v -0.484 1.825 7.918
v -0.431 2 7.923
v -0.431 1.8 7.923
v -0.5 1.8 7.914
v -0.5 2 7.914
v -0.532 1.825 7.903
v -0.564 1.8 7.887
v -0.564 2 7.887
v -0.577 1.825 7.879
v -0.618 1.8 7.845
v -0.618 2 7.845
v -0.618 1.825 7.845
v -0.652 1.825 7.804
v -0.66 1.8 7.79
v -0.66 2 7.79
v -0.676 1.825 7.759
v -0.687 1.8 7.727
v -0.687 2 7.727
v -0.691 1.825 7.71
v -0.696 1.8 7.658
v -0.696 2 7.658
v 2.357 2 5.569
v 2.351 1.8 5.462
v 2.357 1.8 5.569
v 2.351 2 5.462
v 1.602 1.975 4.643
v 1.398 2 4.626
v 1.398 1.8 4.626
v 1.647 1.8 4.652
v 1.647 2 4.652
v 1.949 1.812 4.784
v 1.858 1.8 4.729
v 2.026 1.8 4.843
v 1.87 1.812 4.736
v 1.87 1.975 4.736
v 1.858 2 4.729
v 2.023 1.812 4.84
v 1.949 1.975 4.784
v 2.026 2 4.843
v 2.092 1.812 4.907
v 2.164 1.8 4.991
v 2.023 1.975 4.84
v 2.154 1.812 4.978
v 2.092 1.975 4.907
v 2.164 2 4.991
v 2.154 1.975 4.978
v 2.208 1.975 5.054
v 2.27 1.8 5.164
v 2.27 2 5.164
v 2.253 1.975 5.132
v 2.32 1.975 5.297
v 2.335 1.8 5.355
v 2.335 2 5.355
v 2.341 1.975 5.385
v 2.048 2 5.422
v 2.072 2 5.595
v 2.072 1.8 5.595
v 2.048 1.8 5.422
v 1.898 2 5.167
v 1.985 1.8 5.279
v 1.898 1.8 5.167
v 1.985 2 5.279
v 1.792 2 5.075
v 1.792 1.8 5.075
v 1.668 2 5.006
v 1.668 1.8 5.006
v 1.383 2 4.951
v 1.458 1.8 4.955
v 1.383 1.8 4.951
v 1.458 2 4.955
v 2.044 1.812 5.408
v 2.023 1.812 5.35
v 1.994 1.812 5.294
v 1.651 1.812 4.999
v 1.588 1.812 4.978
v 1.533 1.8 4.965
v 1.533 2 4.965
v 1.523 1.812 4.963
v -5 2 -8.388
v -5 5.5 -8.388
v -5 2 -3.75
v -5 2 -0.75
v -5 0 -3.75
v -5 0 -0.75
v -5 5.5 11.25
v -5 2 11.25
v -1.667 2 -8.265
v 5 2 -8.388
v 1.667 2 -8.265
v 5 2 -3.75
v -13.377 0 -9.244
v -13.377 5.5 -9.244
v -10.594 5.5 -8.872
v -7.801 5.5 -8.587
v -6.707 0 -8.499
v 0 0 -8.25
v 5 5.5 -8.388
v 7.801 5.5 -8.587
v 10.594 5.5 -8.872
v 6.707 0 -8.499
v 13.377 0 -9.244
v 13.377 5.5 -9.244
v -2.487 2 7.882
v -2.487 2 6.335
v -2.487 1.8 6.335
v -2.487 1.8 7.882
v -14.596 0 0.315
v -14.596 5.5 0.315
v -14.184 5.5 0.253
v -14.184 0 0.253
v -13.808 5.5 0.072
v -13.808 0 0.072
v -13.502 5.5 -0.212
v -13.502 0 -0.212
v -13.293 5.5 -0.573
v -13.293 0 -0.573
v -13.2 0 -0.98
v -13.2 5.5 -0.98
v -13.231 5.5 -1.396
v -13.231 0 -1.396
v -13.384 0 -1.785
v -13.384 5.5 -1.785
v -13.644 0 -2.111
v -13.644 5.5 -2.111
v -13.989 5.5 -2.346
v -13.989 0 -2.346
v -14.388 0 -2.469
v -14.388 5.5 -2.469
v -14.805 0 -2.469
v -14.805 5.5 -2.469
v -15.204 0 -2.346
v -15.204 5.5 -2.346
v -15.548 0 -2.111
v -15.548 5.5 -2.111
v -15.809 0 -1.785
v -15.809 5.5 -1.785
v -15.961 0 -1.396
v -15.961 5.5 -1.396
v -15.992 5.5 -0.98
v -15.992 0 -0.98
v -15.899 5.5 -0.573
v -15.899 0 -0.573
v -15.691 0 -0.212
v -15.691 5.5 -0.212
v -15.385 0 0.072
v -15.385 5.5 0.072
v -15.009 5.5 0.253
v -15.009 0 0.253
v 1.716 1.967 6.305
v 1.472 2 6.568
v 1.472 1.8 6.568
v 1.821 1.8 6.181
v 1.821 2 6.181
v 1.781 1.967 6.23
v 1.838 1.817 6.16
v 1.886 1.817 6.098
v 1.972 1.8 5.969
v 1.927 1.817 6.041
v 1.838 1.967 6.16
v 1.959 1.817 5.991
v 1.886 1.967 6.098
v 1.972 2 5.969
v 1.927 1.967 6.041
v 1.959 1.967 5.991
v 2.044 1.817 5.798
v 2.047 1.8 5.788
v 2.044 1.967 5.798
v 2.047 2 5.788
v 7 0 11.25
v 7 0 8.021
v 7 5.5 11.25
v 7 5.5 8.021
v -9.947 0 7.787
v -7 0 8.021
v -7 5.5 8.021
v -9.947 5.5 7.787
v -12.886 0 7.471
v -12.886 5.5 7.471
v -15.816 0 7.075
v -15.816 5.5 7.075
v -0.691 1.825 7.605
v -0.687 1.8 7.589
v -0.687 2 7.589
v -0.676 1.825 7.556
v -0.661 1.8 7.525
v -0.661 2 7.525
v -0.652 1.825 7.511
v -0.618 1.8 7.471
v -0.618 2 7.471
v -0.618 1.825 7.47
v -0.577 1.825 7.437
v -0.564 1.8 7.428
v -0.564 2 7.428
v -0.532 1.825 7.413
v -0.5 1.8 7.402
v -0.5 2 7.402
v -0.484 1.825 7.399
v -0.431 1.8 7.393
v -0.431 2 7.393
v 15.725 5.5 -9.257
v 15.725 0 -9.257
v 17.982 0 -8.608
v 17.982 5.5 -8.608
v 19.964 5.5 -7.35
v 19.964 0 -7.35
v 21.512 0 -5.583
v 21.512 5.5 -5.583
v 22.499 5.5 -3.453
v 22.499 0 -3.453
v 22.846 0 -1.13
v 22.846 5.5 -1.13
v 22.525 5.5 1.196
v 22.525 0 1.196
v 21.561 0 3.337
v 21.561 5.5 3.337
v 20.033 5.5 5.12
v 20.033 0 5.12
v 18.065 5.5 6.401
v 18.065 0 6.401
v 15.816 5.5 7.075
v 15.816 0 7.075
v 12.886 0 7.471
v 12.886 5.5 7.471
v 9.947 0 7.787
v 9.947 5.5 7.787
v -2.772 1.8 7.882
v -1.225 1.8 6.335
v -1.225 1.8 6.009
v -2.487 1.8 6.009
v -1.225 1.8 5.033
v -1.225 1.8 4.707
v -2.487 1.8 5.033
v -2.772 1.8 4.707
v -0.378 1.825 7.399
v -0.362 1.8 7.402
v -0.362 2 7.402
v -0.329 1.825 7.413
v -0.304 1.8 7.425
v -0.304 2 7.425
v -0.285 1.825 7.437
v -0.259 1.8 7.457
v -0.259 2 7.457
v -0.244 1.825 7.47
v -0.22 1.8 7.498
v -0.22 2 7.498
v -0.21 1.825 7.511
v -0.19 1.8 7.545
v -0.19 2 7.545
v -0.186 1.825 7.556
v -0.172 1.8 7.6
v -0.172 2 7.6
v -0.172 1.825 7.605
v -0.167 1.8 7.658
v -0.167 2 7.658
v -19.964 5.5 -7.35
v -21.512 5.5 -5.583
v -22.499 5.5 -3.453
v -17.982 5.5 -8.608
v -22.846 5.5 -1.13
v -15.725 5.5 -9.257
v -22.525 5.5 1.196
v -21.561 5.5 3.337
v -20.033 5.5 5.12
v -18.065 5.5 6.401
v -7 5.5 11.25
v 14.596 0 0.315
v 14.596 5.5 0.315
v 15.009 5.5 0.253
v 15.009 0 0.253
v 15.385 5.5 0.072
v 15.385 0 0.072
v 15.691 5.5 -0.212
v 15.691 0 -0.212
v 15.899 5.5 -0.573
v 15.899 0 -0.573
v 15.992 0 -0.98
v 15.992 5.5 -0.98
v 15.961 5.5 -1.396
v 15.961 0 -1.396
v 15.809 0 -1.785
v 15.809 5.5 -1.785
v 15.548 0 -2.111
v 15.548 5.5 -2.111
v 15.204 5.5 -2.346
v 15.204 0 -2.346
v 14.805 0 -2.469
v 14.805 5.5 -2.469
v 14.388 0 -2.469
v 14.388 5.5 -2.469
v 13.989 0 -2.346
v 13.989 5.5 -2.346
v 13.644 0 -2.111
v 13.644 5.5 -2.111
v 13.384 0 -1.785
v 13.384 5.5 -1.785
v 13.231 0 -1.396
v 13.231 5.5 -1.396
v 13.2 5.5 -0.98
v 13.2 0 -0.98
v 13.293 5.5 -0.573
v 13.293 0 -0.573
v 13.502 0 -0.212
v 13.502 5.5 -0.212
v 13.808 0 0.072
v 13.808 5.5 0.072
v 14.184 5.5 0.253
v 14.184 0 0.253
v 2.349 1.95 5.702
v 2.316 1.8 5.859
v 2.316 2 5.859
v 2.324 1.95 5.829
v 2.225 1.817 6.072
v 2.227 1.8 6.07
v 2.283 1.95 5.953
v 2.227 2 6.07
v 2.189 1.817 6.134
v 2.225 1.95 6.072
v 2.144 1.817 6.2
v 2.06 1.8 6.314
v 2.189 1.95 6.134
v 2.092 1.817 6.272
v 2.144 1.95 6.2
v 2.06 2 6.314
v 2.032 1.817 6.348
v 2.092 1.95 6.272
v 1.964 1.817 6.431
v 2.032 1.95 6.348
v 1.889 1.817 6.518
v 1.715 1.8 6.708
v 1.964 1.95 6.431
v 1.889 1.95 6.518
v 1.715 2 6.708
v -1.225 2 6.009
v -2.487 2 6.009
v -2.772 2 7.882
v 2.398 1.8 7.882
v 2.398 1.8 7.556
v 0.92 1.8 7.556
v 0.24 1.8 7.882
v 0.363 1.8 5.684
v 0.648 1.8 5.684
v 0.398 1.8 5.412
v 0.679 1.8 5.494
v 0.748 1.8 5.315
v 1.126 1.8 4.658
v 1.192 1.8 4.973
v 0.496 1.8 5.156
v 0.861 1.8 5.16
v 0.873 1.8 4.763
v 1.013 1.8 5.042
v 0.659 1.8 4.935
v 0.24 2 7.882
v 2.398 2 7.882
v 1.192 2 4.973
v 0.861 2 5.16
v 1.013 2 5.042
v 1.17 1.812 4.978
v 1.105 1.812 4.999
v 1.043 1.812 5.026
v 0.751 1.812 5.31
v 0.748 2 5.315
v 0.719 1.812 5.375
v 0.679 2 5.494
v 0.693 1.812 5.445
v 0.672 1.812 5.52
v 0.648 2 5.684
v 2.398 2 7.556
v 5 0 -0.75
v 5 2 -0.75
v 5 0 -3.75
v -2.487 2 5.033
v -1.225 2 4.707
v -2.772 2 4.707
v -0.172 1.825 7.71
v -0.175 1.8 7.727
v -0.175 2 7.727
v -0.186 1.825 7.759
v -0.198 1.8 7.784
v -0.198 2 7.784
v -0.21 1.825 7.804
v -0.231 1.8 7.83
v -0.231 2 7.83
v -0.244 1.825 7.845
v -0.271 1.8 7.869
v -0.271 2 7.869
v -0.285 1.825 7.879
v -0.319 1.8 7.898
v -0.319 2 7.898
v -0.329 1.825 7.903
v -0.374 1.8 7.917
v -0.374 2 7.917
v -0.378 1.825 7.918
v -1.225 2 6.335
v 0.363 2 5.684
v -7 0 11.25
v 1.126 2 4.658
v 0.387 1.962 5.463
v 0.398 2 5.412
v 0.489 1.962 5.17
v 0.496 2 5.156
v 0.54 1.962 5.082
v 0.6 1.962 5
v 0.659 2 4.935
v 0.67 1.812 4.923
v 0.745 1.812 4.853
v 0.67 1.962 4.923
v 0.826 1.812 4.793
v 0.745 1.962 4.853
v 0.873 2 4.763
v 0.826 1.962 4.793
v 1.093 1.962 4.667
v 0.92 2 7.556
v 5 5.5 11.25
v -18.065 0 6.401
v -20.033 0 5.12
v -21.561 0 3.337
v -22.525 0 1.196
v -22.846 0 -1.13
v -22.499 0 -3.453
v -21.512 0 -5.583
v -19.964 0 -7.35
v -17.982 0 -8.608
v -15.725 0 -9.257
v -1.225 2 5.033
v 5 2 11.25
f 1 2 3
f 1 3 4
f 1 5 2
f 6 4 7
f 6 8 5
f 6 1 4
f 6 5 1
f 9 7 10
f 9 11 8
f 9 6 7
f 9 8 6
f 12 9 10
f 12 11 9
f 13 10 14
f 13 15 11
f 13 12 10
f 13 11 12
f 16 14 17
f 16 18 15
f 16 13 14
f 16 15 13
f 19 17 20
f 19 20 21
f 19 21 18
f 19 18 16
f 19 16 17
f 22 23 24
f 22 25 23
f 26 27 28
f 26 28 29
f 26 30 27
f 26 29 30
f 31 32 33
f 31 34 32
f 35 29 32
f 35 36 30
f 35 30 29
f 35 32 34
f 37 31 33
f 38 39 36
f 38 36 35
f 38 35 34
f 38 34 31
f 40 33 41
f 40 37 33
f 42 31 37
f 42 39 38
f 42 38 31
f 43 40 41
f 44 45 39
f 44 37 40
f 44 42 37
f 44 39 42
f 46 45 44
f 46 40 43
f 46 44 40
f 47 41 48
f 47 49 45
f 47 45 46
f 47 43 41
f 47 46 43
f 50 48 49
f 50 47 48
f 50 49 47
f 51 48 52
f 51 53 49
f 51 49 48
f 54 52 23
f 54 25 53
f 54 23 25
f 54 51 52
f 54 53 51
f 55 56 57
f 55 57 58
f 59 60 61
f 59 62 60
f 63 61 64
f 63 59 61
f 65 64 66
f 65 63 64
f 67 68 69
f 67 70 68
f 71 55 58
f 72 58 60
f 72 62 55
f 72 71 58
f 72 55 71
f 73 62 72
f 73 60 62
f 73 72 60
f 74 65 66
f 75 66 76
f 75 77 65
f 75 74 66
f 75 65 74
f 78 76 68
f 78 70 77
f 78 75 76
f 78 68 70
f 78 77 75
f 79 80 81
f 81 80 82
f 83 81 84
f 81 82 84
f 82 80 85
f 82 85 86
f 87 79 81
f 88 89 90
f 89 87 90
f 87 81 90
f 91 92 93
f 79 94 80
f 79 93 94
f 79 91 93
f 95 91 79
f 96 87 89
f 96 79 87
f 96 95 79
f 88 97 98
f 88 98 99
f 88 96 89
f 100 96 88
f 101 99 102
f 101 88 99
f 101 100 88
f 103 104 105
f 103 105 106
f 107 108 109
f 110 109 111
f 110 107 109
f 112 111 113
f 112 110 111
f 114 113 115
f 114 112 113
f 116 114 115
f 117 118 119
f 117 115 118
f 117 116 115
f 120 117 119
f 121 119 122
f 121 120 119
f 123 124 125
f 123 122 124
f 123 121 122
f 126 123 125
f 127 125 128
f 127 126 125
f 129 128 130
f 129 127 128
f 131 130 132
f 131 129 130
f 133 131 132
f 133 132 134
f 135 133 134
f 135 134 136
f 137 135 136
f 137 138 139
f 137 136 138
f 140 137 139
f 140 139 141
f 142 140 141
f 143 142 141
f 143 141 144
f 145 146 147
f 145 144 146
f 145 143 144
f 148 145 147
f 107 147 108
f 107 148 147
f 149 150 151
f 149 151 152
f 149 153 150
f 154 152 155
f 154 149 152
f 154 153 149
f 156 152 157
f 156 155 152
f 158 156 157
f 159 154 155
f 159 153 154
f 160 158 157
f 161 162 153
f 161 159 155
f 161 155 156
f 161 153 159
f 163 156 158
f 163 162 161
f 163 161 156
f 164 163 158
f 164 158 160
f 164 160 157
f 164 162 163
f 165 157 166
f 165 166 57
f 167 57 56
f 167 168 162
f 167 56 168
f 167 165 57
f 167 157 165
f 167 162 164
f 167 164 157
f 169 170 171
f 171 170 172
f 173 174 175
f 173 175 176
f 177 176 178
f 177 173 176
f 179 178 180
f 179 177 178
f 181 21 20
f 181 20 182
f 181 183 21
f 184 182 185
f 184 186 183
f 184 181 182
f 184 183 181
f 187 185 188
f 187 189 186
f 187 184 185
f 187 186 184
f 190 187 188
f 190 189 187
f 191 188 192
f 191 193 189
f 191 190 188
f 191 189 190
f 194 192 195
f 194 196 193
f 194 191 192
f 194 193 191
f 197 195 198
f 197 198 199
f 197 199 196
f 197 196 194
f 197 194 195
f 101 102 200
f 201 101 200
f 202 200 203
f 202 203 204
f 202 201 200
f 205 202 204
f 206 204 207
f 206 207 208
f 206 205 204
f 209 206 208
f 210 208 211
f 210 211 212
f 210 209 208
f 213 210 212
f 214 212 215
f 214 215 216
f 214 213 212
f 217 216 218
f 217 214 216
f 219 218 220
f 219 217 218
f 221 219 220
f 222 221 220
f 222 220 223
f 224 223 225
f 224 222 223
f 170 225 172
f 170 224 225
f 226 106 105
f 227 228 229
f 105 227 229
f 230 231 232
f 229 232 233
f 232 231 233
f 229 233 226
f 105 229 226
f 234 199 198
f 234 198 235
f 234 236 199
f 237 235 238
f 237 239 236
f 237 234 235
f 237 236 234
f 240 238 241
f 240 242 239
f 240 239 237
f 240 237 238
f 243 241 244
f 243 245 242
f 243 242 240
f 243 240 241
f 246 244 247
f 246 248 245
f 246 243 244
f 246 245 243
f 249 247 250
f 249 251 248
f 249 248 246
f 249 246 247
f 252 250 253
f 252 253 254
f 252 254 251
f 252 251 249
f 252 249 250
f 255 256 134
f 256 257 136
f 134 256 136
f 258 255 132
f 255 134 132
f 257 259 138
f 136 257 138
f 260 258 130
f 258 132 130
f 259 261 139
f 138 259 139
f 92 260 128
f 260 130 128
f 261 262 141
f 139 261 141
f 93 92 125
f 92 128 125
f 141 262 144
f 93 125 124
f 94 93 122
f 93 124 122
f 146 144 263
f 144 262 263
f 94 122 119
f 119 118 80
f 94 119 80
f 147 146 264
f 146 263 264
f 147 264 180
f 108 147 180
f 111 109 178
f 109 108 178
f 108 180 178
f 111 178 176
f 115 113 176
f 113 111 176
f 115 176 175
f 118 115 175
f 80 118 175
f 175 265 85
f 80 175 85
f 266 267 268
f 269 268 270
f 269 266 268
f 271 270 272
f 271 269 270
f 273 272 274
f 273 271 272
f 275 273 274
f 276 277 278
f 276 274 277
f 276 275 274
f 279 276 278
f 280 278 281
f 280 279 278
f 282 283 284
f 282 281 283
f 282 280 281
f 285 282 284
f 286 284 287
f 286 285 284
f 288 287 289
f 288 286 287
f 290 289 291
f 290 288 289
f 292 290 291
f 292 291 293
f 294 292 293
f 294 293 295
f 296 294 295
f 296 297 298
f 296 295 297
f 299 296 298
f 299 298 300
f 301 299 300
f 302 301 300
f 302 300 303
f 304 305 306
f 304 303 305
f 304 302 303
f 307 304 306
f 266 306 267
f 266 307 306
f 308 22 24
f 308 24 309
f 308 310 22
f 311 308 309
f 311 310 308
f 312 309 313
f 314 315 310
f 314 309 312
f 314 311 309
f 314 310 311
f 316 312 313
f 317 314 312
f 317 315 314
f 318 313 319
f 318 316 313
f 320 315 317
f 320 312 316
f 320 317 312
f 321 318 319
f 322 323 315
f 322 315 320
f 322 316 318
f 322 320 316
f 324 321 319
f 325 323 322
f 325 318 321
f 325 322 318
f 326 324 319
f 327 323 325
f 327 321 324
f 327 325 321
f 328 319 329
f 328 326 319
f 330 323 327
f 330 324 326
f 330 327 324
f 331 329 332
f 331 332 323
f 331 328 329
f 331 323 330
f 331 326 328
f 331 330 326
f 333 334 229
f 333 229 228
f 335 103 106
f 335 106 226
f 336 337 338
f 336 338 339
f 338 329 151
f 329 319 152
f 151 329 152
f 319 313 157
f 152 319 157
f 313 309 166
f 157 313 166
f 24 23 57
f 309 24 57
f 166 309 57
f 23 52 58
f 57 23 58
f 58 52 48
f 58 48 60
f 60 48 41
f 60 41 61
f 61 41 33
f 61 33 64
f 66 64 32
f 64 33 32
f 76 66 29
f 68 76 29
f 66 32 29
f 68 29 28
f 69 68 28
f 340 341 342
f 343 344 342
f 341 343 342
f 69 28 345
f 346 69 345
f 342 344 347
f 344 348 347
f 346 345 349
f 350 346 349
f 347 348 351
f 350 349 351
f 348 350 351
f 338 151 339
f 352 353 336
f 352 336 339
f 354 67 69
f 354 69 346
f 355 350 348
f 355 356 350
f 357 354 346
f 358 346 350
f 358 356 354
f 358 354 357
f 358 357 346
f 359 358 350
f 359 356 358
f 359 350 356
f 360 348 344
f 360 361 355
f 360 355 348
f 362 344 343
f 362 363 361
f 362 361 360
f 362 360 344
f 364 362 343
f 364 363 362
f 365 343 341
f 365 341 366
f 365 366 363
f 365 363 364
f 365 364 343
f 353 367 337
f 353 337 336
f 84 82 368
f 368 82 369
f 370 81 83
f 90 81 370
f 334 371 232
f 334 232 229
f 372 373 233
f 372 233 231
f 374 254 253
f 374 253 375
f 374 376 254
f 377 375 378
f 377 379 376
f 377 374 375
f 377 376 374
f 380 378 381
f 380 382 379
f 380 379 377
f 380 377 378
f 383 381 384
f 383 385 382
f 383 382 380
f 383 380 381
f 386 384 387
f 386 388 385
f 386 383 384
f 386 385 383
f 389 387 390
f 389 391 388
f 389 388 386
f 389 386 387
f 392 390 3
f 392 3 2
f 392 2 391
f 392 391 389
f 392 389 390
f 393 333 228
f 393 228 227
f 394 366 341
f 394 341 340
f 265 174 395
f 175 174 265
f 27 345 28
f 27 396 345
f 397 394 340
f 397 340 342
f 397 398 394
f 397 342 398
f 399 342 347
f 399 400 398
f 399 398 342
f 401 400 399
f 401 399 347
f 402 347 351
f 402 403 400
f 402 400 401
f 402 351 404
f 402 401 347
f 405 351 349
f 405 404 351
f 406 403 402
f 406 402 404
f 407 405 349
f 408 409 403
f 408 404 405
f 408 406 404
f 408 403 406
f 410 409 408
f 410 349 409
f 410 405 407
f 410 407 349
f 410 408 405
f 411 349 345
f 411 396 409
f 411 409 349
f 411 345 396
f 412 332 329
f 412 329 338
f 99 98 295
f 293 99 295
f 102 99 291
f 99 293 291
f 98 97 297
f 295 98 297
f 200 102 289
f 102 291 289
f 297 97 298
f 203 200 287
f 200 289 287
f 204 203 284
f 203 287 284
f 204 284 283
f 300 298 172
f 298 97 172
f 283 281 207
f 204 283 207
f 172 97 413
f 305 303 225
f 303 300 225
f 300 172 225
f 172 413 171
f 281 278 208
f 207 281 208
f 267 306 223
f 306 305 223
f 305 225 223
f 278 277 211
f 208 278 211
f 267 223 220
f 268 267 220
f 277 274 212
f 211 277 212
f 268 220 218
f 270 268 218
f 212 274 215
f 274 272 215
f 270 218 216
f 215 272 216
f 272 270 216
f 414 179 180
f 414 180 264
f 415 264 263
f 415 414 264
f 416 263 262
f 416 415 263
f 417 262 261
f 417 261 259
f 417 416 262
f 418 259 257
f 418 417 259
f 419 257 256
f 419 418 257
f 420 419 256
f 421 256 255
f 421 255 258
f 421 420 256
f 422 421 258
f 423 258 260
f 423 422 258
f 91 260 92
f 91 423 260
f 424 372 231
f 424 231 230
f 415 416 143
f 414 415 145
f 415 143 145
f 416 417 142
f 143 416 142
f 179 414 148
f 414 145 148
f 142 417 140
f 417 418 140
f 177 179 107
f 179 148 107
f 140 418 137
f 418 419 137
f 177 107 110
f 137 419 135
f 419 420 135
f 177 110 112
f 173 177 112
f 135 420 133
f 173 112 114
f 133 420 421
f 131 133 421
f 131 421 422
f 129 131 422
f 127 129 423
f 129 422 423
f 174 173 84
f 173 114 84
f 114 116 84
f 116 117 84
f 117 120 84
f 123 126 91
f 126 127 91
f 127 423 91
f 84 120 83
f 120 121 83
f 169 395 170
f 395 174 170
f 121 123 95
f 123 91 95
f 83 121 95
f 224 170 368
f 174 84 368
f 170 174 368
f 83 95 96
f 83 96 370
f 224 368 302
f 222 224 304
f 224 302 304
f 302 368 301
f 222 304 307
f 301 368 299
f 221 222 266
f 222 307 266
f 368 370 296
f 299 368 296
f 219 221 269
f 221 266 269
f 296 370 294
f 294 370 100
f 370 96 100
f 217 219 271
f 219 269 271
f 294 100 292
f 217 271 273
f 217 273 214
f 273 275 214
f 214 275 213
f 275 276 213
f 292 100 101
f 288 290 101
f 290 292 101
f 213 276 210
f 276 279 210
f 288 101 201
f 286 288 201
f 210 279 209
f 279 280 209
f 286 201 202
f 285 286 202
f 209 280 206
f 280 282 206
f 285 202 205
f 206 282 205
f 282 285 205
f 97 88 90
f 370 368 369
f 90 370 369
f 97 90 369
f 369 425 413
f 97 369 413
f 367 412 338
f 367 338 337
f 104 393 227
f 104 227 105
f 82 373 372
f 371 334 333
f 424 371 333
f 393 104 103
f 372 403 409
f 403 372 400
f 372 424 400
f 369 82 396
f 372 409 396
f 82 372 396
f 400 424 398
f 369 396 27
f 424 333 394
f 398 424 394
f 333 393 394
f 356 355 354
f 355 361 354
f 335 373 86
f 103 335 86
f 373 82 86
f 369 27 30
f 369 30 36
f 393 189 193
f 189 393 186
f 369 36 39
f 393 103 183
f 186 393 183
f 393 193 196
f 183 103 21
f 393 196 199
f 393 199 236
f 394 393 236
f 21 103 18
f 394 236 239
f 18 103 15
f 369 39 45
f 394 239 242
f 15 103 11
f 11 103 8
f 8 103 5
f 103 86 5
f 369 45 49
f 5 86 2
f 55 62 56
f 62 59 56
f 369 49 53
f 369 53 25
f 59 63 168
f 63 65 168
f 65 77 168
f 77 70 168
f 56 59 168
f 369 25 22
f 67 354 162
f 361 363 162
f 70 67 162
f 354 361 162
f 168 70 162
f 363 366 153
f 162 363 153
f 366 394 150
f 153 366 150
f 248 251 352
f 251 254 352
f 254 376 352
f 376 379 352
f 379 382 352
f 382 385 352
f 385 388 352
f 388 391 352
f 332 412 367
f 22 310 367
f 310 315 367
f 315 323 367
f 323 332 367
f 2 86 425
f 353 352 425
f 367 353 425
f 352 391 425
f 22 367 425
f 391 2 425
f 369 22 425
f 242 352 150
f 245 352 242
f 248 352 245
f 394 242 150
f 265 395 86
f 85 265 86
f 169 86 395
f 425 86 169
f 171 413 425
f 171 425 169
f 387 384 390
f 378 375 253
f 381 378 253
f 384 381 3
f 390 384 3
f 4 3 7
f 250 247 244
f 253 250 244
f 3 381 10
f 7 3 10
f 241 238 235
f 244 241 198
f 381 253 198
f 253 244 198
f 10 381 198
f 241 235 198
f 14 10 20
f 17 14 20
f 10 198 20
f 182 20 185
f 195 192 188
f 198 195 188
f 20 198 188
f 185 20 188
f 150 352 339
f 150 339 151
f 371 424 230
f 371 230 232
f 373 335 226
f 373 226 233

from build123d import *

# Parameters (mm, degrees)
SKETCH2_R                       = 1.4
BOSS_EXTRUDE1_DEPTH             = 14
BOSS_EXTRUDE2_REACH             = 34.049
BOSS_EXTRUDE2_END_RADIUS        = 107
SKETCH3_W                       = 14
SKETCH3_H                       = 14
BOSS_EXTRUDE2_DIRECTION_2_DEPTH = 3
SKETCH19_W                      = 15.846179349
SKETCH19_H                      = 3
CUT_EXTRUDE4_DEPTH              = 22
CUT_EXTRUDE8_DEPTH              = 34.788712692
SKETCH25_W                      = 10
SKETCH25_H                      = 3
CUT_EXTRUDE9_DEPTH              = 2
CUT_EXTRUDE10_DEPTH             = 0.2


with BuildPart() as part:
    # Sketch2 → Boss-Extrude1 (new body)
    with BuildSketch(Plane(origin=(0, 0, 0), x_dir=(1, 0, 0), z_dir=(0, 1, 0))):
        with BuildLine():
            ThreePointArc((-13.376751707, 9.244064366), (0, 8.25), (13.376751707, 9.244064366))
            ThreePointArc((13.376751707, 9.244064366), (22.755560222, 2.304111135), (15.815606991, -7.07469738))
            ThreePointArc((15.815606991, -7.07469738), (0, -8.25), (-15.815606991, -7.07469738))
            ThreePointArc((-15.815606991, -7.07469738), (-22.755560222, 2.304111135), (-13.376751707, 9.244064366))
        make_face()
        with Locations(Location((-14.596179349, 1.084683493, 0), (0, 0, 270))):
            Circle(SKETCH2_R, mode=Mode.SUBTRACT)
        with Locations(Location((14.596179349, 1.084683493, 0), (0, 0, 270))):
            Circle(SKETCH2_R, mode=Mode.SUBTRACT)
    extrude(amount=BOSS_EXTRUDE1_DEPTH)

    # Boss-Extrude2: up to this cylinder (the profile starts outside it)
    boss_extrude2_end = Plane(origin=(0, 7, -98.75), z_dir=(0, -1, 0)) * Cylinder(BOSS_EXTRUDE2_END_RADIUS, 283.098, mode=Mode.PRIVATE)
    # Sketch3 → Boss-Extrude2 (add, up to the surface)
    with BuildSketch(Plane.XY.offset(8.25), mode=Mode.PRIVATE) as boss_extrude2_sk1:
        with Locations((0, 7)):
            Rectangle(SKETCH3_W, SKETCH3_H)
    boss_extrude2_tool1 = extrude(boss_extrude2_sk1.sketch, amount=-BOSS_EXTRUDE2_REACH, mode=Mode.PRIVATE) - boss_extrude2_end
    add(boss_extrude2_tool1.solids().sort_by_distance((0, 7, 8.25))[0])
    add(boss_extrude2_tool1.solids().sort_by_distance((0, 7, 8.25))[1])

    # Sketch3 → Boss-Extrude2 direction 2 (add)
    with BuildSketch(Plane.XY.offset(8.25)):
        with Locations((0, 7)):
            Rectangle(SKETCH3_W, SKETCH3_H)
    extrude(amount=BOSS_EXTRUDE2_DIRECTION_2_DEPTH)

    # Sketch19 → Cut-Extrude4 (cut)
    with BuildSketch(Plane.XY.offset(8.25)):
        with Locations((-14.923089674, 7)):
            Rectangle(SKETCH19_W, SKETCH19_H)
    cut_extrude4 = extrude(amount=-CUT_EXTRUDE4_DEPTH, mode=Mode.SUBTRACT)

    # Mirror2: Cut-Extrude4 across plane
    add(cut_extrude4.mirror(Plane(origin=(0, 0, 0), x_dir=(0, 0, 1), z_dir=(1, 0, 0))), mode=Mode.SUBTRACT)

    # Sketch24 → Cut-Extrude8 (cut, through all)
    with BuildSketch(Plane.XY.offset(11.25)):
        Polygon((-5, 8.5), (-7, 8.5), (-7, 5.5), (-5, 5.5), (-5, 2), (5, 2), (5, 5.5), (7, 5.5), (7, 8.5), (5, 8.5), (5, 12), (-5, 12), align=None)
    extrude(amount=-CUT_EXTRUDE8_DEPTH, mode=Mode.SUBTRACT)


with BuildPart() as cut_extrude8_kept_piece:
    # of the separate pieces the step leaves, the one the design keeps (cut_extrude8_pieces_kept)
    add(part.part.solids().sort_by_distance((15.815606991, 0, 7.07469738))[0])

    # Sketch25 → Cut-Extrude9 (cut)
    with BuildSketch(Plane(origin=(0, 2, 0), x_dir=(1, 0, 0), z_dir=(0, 1, 0))):
        with Locations((0, 2.25)):
            Rectangle(SKETCH25_W, SKETCH25_H)
    extrude(amount=-CUT_EXTRUDE9_DEPTH, mode=Mode.SUBTRACT)

    # Sketch26 → Cut-Extrude10 (cut)
    with BuildSketch(Plane(origin=(0, 2, 0), x_dir=(1, 0, 0), z_dir=(0, 1, 0))):
        Polygon((-2.771713643, -4.706914557), (-1.224918771, -4.706914557), (-1.224918771, -5.032555583), (-2.486777746, -5.032555583), (-2.486777746, -6.00947866), (-1.224918771, -6.00947866), (-1.224918771, -6.335119685), (-2.486777746, -6.335119685), (-2.486777746, -7.881914557), (-2.771713643, -7.881914557), align=None)
        with BuildLine():
            add(Edge.make_bspline(
                [(-0.431168771, -7.393453019), (-0.413488364, -7.394503641), (-0.378827994, -7.396563264), (-0.328718213, -7.410693533), (-0.283365915, -7.435783889), (-0.242968807, -7.469223695), (-0.209670789, -7.509769047), (-0.18368627, -7.554759621), (-0.16967909, -7.605288923), (-0.16763447, -7.640150128), (-0.166585438, -7.658036352)],
                knots=[0, 0, 0, 0, 1.020151414, 1.999887582, 2.974338812, 3.990962822, 5.007586832, 5.987933904, 6.967670073, 8, 8, 8, 8], degree=3))
            add(Edge.make_bspline(
                [(-0.166585438, -7.658036352), (-0.167670019, -7.675492801), (-0.169808796, -7.709916663), (-0.183654162, -7.760064847), (-0.209868822, -7.805083538), (-0.242739137, -7.846179049), (-0.283375901, -7.879689696), (-0.328825433, -7.904566588), (-0.37871036, -7.919708598), (-0.413468739, -7.921637453), (-0.431168771, -7.922619685)],
                knots=[0, 0, 0, 0, 1.009421747, 1.99056486, 2.972319754, 3.999869655, 5.017953583, 5.993804169, 6.978383603, 8, 8, 8, 8], degree=3))
            add(Edge.make_bspline(
                [(-0.431168771, -7.922619685), (-0.448881557, -7.921672994), (-0.483461555, -7.919824803), (-0.533160278, -7.904255686), (-0.5788866, -7.879922976), (-0.619515453, -7.846116565), (-0.652661066, -7.805295007), (-0.677721235, -7.759754806), (-0.69277087, -7.710060216), (-0.69475014, -7.675521076), (-0.695752105, -7.658036352)],
                knots=[0, 0, 0, 0, 1.022052826, 1.995314843, 2.982371812, 4.00089066, 5.028879526, 6.005146991, 6.990147033, 8, 8, 8, 8], degree=3))
            add(Edge.make_bspline(
                [(-0.695752105, -7.658036352), (-0.694788629, -7.640120843), (-0.692907561, -7.605143011), (-0.67768964, -7.555069535), (-0.652855505, -7.509559594), (-0.619286325, -7.469285553), (-0.578896428, -7.435551358), (-0.533270585, -7.410999724), (-0.483341859, -7.396448778), (-0.448861415, -7.394468924), (-0.431168771, -7.393453019)],
                knots=[0, 0, 0, 0, 1.032775665, 2.016367738, 2.991239715, 4.008302682, 5.025365648, 6.011011707, 6.979408107, 8, 8, 8, 8], degree=3))
        make_face()
        with BuildLine():
            Line((0.647517126, -5.683837634), (0.362581229, -5.683837634))
            add(Edge.make_bspline(
                [(0.362581229, -5.683837634), (0.364438289, -5.646036186), (0.368085506, -5.571795148), (0.385165454, -5.463551318), (0.409604678, -5.360087322), (0.444159069, -5.2622339), (0.487072621, -5.16912584), (0.53853486, -5.081132968), (0.599489281, -4.998590961), (0.668619676, -4.922265011), (0.743702656, -4.852244857), (0.824715901, -4.79177903), (0.909846747, -4.740690856), (0.998836916, -4.697981444), (1.092690427, -4.665923155), (1.190555591, -4.642136382), (1.292862379, -4.627824983), (1.362567256, -4.626286663), (1.398017927, -4.625504301)],
                knots=[0, 0, 0, 0, 1.10065271, 2.161652631, 3.183658789, 4.190468796, 5.17591951, 6.163126047, 7.15150782, 8.156236427, 9.156009102, 10.134482811, 11.092018607, 12.041330605, 13.001268258, 13.972401359, 14.968799086, 16, 16, 16, 16], degree=3))
            add(Edge.make_bspline(
                [(1.398017927, -4.625504301), (1.432832323, -4.626319329), (1.501241367, -4.627920831), (1.601083338, -4.64167405), (1.696131312, -4.663214694), (1.7861995, -4.693436536), (1.870569287, -4.734062409), (1.949874478, -4.782864462), (2.025059213, -4.839306738), (2.092738224, -4.905758412), (2.154884839, -4.976699146), (2.208499027, -5.052434601), (2.254412397, -5.130656882), (2.292682649, -5.211962465), (2.320855004, -5.297116898), (2.342243807, -5.384880432), (2.354333675, -5.47616151), (2.356189167, -5.537943886), (2.357132511, -5.569354461)],
                knots=[0, 0, 0, 0, 1.111607364, 2.184268762, 3.212621178, 4.221274766, 5.211760367, 6.196651075, 7.1921475, 8.207485113, 9.220403448, 10.201281604, 11.166441695, 12.114753415, 13.065576456, 14.026450734, 14.996634279, 16, 16, 16, 16], degree=3))
            add(Edge.make_bspline(
                [(2.357132511, -5.569354461), (2.355596479, -5.613575711), (2.352551372, -5.701242191), (2.32650333, -5.830069959), (2.285821138, -5.954886846), (2.236837822, -6.055341399), (2.187423533, -6.136288925), (2.142894151, -6.202935536), (2.090765358, -6.274695497), (2.030278435, -6.35132851), (1.962684615, -6.433434831), (1.887371653, -6.52096486), (1.803802494, -6.613014251), (1.745147997, -6.675884332), (1.714754706, -6.708462033)],
                knots=[0, 0, 0, 0, 1.184426356, 2.348067706, 3.509069118, 4.696110526, 5.333549288, 6.050745305, 6.844228056, 7.710549037, 8.667450064, 9.695053472, 10.805634456, 12, 12, 12, 12], degree=3))
            Line((1.714754706, -6.708462033), (0.920368689, -7.556273532))
            Line((0.920368689, -7.556273532), (2.397837639, -7.556273532))
            Line((2.397837639, -7.556273532), (2.397837639, -7.881914557))
            Line((2.397837639, -7.881914557), (0.240465844, -7.881914557))
            Line((0.240465844, -7.881914557), (1.471795972, -6.567902137))
            add(Edge.make_bspline(
                [(1.471795972, -6.567902137), (1.501775127, -6.536607245), (1.559358947, -6.476496161), (1.64080457, -6.388736476), (1.713955653, -6.307320821), (1.779285716, -6.232403024), (1.835377539, -6.162887244), (1.885154492, -6.101024906), (1.925037564, -6.044097655), (1.968322244, -5.978111527), (2.010244927, -5.897546067), (2.046269707, -5.799090506), (2.068236034, -5.697737927), (2.070871135, -5.629246794), (2.072196613, -5.594795166)],
                knots=[0, 0, 0, 0, 1.329631726, 2.553950428, 3.673215718, 4.687767853, 5.603093632, 6.413772471, 7.123043292, 7.734684054, 8.834405432, 9.900288307, 10.943827018, 12, 12, 12, 12], degree=3))
            add(Edge.make_bspline(
                [(2.072196613, -5.594795166), (2.071619904, -5.573131326), (2.070483321, -5.530436058), (2.06045241, -5.467837976), (2.045293594, -5.407454181), (2.023571824, -5.349098934), (1.994899996, -5.293358949), (1.959999144, -5.240166378), (1.919731015, -5.188741388), (1.873148078, -5.140523753), (1.82197477, -5.096362945), (1.767914273, -5.057243239), (1.710718821, -5.024550617), (1.650629567, -4.997750445), (1.587814034, -4.976727064), (1.52215073, -4.962159638), (1.453821086, -4.953013385), (1.407163558, -4.951775886), (1.383389522, -4.951145326)],
                knots=[0, 0, 0, 0, 0.991446411, 1.95395049, 2.89581595, 3.838931463, 4.798493298, 5.75982156, 6.748411868, 7.785213223, 8.824556874, 9.840280684, 10.836137867, 11.835679398, 12.848801643, 13.863922112, 14.911575587, 16, 16, 16, 16], degree=3))
            add(Edge.make_bspline(
                [(1.383389522, -4.951145326), (1.358560267, -4.951793963), (1.309799709, -4.953067778), (1.238208872, -4.961978337), (1.169913916, -4.977350635), (1.104743047, -4.99837519), (1.042585994, -5.025098302), (0.98374504, -5.058382956), (0.928352276, -5.098100839), (0.876303573, -5.143131915), (0.828348392, -5.193267525), (0.78621444, -5.249156563), (0.749398942, -5.309778575), (0.717277708, -5.374969989), (0.69119219, -5.445322347), (0.671259403, -5.520585908), (0.655487049, -5.600433875), (0.650217891, -5.655574631), (0.647517126, -5.683837634)],
                knots=[0, 0, 0, 0, 1.031018746, 2.02475058, 2.990194455, 3.934040569, 4.864654155, 5.795059489, 6.735614925, 7.690564532, 8.649604399, 9.611025574, 10.590972636, 11.591080095, 12.624614302, 13.701020113, 14.821632451, 16, 16, 16, 16], degree=3))
        make_face()
    extrude(amount=-CUT_EXTRUDE10_DEPTH, mode=Mode.SUBTRACT)


solid = cut_extrude8_kept_piece.part
